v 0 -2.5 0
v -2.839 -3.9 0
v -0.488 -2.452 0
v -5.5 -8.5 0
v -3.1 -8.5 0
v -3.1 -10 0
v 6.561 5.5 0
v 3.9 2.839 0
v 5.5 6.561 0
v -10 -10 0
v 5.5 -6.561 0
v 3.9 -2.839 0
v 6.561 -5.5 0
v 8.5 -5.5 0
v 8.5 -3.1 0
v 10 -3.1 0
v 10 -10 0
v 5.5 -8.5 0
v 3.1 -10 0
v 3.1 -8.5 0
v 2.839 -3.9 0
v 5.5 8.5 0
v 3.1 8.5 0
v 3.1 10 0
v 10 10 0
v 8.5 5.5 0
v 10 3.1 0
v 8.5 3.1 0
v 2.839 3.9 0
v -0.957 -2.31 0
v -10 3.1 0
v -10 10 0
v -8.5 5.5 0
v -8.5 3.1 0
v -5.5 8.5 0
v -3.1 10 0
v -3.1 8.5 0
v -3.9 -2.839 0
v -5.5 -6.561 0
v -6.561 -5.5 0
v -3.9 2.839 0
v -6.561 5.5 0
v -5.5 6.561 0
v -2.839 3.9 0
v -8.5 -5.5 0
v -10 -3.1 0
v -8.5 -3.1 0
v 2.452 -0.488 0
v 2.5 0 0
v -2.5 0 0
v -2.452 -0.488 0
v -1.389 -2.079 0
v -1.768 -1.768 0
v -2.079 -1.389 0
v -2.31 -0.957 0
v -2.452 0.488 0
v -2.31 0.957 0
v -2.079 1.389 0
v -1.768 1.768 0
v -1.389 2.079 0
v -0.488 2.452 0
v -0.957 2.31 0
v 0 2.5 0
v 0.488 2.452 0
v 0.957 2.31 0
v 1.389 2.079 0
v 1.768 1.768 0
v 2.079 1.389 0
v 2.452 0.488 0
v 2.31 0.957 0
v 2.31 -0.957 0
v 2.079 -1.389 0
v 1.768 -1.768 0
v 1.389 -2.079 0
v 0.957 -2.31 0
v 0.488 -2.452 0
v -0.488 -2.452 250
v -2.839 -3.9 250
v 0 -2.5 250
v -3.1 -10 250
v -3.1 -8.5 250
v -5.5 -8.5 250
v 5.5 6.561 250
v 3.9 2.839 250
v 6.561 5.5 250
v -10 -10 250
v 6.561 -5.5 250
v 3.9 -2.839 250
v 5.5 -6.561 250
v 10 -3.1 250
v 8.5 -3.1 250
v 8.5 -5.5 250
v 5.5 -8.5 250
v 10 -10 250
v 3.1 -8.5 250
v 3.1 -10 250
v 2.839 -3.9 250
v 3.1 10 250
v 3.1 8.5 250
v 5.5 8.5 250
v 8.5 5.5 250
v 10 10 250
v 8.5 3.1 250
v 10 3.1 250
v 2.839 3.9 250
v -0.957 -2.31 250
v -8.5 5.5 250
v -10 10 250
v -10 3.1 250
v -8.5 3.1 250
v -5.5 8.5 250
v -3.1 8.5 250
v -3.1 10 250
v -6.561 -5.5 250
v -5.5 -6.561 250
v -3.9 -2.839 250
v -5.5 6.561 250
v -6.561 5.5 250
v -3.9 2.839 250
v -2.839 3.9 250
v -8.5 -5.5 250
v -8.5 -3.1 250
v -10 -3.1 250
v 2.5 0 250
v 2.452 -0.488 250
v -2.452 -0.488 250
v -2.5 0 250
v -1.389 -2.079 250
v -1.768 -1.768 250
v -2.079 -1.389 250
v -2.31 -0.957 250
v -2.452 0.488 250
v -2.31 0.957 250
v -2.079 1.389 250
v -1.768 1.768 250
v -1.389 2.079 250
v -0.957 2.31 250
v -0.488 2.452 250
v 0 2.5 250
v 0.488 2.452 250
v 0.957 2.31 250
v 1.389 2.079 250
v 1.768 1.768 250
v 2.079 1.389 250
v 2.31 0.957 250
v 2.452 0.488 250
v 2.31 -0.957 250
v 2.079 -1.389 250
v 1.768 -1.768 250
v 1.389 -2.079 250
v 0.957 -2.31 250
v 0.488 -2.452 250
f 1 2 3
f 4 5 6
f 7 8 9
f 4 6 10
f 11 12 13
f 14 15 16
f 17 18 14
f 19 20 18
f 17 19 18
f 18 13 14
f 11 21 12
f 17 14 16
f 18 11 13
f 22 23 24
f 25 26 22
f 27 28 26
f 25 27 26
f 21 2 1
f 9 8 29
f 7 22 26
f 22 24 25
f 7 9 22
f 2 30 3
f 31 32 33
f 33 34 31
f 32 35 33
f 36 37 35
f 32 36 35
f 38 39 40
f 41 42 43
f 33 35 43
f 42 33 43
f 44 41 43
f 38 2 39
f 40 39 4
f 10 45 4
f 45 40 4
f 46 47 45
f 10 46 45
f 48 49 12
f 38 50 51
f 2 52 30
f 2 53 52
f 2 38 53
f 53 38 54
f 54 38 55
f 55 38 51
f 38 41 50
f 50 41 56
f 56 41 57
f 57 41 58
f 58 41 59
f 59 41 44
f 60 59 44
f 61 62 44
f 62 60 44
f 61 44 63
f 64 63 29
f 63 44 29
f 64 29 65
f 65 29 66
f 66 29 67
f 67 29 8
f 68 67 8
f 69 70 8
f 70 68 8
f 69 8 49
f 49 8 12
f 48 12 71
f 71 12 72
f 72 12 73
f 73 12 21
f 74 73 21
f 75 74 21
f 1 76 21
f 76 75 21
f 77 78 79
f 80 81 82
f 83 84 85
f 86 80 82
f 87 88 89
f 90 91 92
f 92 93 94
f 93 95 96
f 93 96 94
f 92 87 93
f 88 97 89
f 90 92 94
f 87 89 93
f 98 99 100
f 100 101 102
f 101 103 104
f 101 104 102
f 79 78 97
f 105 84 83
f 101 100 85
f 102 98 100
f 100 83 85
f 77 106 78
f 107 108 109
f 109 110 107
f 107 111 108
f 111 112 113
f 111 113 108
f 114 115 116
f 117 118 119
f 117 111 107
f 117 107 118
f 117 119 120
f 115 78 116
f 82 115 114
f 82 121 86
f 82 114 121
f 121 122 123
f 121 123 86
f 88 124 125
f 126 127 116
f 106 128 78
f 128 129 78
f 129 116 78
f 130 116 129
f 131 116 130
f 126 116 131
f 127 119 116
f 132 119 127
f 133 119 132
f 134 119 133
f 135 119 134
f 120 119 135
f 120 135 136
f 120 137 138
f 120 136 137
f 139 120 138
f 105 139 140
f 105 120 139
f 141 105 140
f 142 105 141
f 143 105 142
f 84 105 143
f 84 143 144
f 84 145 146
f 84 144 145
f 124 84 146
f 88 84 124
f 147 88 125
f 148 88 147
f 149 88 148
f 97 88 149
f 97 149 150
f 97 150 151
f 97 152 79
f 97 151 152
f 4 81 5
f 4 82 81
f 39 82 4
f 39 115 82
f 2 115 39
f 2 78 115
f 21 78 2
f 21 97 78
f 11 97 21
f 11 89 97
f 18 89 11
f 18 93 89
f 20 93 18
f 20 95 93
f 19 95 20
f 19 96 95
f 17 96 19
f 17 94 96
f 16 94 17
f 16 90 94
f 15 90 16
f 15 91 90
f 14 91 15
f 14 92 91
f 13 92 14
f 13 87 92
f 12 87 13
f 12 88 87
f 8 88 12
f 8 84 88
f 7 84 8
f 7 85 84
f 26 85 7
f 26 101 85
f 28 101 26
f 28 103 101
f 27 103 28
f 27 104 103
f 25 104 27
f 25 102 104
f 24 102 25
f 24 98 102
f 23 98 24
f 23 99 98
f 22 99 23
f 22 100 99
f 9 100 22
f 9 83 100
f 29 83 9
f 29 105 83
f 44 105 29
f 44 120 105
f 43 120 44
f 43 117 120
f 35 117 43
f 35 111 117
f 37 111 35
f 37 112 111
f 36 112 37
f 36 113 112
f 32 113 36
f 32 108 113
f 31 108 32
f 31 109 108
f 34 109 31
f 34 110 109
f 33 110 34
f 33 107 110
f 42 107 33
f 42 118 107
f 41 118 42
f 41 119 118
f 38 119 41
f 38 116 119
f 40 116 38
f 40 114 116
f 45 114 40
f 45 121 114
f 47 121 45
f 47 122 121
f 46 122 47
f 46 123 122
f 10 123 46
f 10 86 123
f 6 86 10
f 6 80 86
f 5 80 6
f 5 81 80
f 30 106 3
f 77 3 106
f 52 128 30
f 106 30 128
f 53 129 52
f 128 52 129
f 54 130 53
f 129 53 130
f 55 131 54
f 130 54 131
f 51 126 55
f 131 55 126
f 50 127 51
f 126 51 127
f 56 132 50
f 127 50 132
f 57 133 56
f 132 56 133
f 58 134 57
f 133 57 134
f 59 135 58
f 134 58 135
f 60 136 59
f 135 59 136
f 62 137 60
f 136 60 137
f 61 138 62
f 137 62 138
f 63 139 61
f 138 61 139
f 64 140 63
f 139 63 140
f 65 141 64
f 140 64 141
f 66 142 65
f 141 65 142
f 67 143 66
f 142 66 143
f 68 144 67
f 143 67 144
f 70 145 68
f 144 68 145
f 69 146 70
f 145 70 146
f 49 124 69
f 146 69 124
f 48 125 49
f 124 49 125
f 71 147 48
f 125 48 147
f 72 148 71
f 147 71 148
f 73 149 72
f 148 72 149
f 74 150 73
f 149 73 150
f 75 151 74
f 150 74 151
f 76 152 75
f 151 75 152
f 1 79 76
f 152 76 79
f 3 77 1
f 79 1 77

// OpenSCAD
// file: lib/primitives.scad
// =============================================================================
// PRIMITIVES LIBRARY
// Common geometric primitives for OpenSCAD projects
// =============================================================================

// Centered rectangle (2D)
module rect(w, h) {
    square([w, h], center = true);
}

// Centered cube (3D)
module box(x, y, z) {
    cube([x, y, z], center = true);
}
// file: lib/2020_extrusion.scad
// =============================================================================
// 2020 ALUMINUM EXTRUSION LIBRARY
// Standard 20x20mm T-slot aluminum extrusion profile
// =============================================================================

use <primitives.scad>

// 2D cross-section profile
module 2020_profile() {
    // Manufacturer dimensions
    size = 20;           // Overall size
    slot_open = 6.2;     // Slot opening width
    slot_depth = 6.1;    // Slot depth from outer edge
    hole_d = 5;          // Center hole diameter
    wall = 1.5;          // Wall/bar thickness
    inner_slot = 11;     // Inner T-slot width (for T-nut)

    // Derived
    half = size / 2;     // 10

    union() {
        // MAIN PROFILE (subtractive)
        difference() {
            rect(size, size);

            // Center hole
            circle(d = hole_d);

            // T-slot cavities on all 4 sides
            for (rot = [0, 90, 180, 270]) {
                rotate([0, 0, rot]) {
                    // Outer slot opening
                    translate([0, half - wall/2])
                        rect(slot_open, wall + 0.01);

                    // Inner cavity
                    translate([0, half - slot_depth/2 - wall/2])
                        rect(inner_slot, slot_depth - wall);
                }
            }
        }

        // DIAGONAL BARS (added last, won't be cut)
        // Extend from center (~radius 3) to corner center (~radius 10)
        for (rot = [45, 135, 225, 315]) {
            rotate([0, 0, rot])
                translate([0, 6.5])
                    rect(wall, 7);
        }
    }
}

// 3D extrusion with specified length
module 2020_extrusion(length = 100) {
    color("silver")
    linear_extrude(height = length)
        2020_profile();
}
// main file
// Raspberry Pi Cloud Rack
// Main design file

$fn = 32;

use <lib/2020_extrusion.scad>

// =============================================================================
// MAIN
// =============================================================================

// Create 250mm long 2020 extrusion
2020_extrusion(250);
